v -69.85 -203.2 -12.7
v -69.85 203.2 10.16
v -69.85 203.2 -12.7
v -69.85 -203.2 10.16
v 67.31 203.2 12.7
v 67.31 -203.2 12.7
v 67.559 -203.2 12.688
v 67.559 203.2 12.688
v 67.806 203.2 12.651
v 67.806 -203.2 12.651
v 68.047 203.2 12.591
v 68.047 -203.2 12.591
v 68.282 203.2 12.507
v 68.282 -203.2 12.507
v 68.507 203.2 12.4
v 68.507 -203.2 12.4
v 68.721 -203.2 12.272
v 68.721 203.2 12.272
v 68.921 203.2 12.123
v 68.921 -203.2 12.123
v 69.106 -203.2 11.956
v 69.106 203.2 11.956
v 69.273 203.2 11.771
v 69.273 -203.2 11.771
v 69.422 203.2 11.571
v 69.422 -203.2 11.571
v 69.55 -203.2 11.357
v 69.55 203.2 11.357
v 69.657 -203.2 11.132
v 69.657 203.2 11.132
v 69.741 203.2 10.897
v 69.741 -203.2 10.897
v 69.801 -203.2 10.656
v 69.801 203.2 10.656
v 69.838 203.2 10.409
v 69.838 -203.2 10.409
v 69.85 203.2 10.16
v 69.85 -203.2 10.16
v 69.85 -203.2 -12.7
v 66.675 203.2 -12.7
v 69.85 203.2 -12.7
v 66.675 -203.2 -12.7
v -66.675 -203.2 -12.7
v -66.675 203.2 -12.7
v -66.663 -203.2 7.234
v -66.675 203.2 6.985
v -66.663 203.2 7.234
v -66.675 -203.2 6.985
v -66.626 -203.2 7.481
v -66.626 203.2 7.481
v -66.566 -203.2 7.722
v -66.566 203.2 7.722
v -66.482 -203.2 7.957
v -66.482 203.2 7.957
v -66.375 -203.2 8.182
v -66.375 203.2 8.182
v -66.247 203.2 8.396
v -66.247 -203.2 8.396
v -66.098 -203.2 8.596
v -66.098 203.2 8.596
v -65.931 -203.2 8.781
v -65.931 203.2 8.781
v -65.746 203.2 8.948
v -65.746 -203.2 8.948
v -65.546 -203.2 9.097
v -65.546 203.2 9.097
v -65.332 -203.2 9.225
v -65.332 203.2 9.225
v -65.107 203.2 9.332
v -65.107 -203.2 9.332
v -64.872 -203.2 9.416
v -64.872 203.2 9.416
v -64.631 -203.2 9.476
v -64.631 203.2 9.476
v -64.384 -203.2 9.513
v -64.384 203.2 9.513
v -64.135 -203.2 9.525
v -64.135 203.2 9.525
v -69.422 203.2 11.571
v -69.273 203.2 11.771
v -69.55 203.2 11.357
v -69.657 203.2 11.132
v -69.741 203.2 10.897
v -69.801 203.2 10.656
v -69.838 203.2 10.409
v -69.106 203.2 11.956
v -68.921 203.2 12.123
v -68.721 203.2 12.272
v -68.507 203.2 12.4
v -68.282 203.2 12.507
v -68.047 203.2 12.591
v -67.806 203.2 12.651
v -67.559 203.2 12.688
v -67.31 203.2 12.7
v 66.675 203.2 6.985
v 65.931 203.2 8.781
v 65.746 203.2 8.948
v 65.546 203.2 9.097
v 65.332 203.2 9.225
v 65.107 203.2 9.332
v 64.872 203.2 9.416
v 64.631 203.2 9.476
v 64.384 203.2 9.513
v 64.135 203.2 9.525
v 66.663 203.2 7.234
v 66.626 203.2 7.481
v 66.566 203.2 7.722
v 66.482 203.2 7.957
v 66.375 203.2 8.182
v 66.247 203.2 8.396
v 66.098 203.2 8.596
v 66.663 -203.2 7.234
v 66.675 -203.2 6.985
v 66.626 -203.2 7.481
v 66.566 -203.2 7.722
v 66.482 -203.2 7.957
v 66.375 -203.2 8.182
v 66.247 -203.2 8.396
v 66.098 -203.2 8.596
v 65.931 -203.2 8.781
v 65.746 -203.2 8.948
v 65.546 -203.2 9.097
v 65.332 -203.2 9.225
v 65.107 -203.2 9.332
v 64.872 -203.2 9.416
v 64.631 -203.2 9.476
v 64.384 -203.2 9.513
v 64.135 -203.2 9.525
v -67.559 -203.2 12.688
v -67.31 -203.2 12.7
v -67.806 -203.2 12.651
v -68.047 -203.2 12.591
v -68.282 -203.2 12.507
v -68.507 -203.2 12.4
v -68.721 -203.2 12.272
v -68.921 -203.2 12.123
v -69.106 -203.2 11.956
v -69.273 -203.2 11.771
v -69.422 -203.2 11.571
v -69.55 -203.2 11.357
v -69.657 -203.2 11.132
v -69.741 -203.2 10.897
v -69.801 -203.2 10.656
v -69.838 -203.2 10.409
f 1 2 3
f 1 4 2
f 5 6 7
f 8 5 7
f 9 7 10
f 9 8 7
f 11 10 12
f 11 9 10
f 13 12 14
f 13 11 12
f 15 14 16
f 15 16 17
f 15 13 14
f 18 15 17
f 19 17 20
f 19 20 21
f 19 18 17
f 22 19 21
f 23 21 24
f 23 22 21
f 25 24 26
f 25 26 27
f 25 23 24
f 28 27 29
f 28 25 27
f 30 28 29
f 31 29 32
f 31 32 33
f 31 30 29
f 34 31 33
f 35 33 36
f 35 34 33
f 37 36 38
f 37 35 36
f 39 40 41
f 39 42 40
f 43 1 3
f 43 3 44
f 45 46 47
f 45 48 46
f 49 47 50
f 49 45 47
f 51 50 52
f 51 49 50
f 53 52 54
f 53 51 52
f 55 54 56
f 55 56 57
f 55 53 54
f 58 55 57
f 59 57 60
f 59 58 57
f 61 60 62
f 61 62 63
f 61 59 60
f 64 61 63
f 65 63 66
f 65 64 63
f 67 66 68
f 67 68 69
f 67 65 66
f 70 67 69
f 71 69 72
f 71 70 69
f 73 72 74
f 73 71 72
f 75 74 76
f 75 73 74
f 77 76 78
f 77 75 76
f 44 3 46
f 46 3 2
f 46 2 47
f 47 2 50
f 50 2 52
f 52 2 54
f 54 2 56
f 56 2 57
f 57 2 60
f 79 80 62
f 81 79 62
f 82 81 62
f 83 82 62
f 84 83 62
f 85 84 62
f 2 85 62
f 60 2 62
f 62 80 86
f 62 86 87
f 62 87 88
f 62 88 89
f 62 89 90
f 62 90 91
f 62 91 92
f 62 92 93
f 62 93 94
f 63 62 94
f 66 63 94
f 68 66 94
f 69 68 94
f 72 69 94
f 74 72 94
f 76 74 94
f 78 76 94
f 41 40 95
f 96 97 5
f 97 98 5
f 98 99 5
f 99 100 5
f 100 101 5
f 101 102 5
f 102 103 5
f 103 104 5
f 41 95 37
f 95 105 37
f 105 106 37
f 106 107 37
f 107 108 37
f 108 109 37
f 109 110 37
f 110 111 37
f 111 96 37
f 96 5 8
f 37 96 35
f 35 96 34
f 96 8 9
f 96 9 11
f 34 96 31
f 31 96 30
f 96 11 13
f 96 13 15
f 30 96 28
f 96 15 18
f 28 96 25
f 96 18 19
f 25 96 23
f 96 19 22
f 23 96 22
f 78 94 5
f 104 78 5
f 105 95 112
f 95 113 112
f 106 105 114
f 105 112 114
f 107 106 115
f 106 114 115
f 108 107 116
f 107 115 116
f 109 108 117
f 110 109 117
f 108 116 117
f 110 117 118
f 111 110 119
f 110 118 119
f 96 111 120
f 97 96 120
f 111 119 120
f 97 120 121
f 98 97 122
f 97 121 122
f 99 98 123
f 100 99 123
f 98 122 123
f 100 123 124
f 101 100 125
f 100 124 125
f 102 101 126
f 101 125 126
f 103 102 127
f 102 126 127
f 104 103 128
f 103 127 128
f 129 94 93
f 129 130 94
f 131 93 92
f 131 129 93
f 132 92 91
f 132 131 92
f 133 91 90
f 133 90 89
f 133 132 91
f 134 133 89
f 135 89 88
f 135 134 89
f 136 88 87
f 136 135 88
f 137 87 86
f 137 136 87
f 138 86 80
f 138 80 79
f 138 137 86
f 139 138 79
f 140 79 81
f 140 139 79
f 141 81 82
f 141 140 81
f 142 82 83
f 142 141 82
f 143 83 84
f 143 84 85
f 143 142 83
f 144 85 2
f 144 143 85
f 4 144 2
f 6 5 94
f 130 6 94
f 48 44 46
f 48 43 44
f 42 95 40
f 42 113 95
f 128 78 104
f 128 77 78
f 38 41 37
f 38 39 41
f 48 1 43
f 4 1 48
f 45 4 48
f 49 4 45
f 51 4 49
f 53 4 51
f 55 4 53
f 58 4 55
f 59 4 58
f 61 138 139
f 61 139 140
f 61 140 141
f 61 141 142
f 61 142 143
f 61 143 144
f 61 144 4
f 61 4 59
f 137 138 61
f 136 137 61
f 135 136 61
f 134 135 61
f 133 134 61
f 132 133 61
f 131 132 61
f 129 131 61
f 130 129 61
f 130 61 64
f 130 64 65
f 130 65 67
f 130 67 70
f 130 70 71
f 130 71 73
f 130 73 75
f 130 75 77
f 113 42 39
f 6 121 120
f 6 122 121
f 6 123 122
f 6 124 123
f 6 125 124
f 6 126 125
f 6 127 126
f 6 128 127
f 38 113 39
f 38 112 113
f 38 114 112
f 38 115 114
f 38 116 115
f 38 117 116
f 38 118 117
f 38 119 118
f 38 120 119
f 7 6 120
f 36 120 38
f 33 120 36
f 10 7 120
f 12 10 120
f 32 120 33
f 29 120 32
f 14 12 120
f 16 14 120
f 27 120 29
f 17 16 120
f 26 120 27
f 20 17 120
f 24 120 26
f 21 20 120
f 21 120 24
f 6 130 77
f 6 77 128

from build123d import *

# Parameters (mm, degrees)
F1_DEPTH = 203.2
F2_R     = 2.54
F3_R     = 2.54


with BuildPart() as f1:
    # F0 (on Front) → F1 (new body, symmetric)
    with BuildSketch(Plane.XZ):
        Polygon((69.85, 12.7), (-69.85, 12.7), (-69.85, -12.7), (-66.675, -12.7), (-66.675, 9.525), (66.675, 9.525), (66.675, -12.7), (69.85, -12.7), align=None)
    extrude(amount=F1_DEPTH, both=True)

    # F2
    f2_edges = [f1.edges().sort_by_distance(p)[0] for p in [
        (-69.85, 0, 12.7),
        (69.85, 0, 12.7),
    ]]
    fillet(f2_edges, radius=F2_R)

    # F3
    f3_edges = [f1.edges().sort_by_distance(p)[0] for p in [
        (-66.675, 0, 9.525),
        (66.675, 0, 9.525),
    ]]
    fillet(f3_edges, radius=F3_R)


solid = f1.part
